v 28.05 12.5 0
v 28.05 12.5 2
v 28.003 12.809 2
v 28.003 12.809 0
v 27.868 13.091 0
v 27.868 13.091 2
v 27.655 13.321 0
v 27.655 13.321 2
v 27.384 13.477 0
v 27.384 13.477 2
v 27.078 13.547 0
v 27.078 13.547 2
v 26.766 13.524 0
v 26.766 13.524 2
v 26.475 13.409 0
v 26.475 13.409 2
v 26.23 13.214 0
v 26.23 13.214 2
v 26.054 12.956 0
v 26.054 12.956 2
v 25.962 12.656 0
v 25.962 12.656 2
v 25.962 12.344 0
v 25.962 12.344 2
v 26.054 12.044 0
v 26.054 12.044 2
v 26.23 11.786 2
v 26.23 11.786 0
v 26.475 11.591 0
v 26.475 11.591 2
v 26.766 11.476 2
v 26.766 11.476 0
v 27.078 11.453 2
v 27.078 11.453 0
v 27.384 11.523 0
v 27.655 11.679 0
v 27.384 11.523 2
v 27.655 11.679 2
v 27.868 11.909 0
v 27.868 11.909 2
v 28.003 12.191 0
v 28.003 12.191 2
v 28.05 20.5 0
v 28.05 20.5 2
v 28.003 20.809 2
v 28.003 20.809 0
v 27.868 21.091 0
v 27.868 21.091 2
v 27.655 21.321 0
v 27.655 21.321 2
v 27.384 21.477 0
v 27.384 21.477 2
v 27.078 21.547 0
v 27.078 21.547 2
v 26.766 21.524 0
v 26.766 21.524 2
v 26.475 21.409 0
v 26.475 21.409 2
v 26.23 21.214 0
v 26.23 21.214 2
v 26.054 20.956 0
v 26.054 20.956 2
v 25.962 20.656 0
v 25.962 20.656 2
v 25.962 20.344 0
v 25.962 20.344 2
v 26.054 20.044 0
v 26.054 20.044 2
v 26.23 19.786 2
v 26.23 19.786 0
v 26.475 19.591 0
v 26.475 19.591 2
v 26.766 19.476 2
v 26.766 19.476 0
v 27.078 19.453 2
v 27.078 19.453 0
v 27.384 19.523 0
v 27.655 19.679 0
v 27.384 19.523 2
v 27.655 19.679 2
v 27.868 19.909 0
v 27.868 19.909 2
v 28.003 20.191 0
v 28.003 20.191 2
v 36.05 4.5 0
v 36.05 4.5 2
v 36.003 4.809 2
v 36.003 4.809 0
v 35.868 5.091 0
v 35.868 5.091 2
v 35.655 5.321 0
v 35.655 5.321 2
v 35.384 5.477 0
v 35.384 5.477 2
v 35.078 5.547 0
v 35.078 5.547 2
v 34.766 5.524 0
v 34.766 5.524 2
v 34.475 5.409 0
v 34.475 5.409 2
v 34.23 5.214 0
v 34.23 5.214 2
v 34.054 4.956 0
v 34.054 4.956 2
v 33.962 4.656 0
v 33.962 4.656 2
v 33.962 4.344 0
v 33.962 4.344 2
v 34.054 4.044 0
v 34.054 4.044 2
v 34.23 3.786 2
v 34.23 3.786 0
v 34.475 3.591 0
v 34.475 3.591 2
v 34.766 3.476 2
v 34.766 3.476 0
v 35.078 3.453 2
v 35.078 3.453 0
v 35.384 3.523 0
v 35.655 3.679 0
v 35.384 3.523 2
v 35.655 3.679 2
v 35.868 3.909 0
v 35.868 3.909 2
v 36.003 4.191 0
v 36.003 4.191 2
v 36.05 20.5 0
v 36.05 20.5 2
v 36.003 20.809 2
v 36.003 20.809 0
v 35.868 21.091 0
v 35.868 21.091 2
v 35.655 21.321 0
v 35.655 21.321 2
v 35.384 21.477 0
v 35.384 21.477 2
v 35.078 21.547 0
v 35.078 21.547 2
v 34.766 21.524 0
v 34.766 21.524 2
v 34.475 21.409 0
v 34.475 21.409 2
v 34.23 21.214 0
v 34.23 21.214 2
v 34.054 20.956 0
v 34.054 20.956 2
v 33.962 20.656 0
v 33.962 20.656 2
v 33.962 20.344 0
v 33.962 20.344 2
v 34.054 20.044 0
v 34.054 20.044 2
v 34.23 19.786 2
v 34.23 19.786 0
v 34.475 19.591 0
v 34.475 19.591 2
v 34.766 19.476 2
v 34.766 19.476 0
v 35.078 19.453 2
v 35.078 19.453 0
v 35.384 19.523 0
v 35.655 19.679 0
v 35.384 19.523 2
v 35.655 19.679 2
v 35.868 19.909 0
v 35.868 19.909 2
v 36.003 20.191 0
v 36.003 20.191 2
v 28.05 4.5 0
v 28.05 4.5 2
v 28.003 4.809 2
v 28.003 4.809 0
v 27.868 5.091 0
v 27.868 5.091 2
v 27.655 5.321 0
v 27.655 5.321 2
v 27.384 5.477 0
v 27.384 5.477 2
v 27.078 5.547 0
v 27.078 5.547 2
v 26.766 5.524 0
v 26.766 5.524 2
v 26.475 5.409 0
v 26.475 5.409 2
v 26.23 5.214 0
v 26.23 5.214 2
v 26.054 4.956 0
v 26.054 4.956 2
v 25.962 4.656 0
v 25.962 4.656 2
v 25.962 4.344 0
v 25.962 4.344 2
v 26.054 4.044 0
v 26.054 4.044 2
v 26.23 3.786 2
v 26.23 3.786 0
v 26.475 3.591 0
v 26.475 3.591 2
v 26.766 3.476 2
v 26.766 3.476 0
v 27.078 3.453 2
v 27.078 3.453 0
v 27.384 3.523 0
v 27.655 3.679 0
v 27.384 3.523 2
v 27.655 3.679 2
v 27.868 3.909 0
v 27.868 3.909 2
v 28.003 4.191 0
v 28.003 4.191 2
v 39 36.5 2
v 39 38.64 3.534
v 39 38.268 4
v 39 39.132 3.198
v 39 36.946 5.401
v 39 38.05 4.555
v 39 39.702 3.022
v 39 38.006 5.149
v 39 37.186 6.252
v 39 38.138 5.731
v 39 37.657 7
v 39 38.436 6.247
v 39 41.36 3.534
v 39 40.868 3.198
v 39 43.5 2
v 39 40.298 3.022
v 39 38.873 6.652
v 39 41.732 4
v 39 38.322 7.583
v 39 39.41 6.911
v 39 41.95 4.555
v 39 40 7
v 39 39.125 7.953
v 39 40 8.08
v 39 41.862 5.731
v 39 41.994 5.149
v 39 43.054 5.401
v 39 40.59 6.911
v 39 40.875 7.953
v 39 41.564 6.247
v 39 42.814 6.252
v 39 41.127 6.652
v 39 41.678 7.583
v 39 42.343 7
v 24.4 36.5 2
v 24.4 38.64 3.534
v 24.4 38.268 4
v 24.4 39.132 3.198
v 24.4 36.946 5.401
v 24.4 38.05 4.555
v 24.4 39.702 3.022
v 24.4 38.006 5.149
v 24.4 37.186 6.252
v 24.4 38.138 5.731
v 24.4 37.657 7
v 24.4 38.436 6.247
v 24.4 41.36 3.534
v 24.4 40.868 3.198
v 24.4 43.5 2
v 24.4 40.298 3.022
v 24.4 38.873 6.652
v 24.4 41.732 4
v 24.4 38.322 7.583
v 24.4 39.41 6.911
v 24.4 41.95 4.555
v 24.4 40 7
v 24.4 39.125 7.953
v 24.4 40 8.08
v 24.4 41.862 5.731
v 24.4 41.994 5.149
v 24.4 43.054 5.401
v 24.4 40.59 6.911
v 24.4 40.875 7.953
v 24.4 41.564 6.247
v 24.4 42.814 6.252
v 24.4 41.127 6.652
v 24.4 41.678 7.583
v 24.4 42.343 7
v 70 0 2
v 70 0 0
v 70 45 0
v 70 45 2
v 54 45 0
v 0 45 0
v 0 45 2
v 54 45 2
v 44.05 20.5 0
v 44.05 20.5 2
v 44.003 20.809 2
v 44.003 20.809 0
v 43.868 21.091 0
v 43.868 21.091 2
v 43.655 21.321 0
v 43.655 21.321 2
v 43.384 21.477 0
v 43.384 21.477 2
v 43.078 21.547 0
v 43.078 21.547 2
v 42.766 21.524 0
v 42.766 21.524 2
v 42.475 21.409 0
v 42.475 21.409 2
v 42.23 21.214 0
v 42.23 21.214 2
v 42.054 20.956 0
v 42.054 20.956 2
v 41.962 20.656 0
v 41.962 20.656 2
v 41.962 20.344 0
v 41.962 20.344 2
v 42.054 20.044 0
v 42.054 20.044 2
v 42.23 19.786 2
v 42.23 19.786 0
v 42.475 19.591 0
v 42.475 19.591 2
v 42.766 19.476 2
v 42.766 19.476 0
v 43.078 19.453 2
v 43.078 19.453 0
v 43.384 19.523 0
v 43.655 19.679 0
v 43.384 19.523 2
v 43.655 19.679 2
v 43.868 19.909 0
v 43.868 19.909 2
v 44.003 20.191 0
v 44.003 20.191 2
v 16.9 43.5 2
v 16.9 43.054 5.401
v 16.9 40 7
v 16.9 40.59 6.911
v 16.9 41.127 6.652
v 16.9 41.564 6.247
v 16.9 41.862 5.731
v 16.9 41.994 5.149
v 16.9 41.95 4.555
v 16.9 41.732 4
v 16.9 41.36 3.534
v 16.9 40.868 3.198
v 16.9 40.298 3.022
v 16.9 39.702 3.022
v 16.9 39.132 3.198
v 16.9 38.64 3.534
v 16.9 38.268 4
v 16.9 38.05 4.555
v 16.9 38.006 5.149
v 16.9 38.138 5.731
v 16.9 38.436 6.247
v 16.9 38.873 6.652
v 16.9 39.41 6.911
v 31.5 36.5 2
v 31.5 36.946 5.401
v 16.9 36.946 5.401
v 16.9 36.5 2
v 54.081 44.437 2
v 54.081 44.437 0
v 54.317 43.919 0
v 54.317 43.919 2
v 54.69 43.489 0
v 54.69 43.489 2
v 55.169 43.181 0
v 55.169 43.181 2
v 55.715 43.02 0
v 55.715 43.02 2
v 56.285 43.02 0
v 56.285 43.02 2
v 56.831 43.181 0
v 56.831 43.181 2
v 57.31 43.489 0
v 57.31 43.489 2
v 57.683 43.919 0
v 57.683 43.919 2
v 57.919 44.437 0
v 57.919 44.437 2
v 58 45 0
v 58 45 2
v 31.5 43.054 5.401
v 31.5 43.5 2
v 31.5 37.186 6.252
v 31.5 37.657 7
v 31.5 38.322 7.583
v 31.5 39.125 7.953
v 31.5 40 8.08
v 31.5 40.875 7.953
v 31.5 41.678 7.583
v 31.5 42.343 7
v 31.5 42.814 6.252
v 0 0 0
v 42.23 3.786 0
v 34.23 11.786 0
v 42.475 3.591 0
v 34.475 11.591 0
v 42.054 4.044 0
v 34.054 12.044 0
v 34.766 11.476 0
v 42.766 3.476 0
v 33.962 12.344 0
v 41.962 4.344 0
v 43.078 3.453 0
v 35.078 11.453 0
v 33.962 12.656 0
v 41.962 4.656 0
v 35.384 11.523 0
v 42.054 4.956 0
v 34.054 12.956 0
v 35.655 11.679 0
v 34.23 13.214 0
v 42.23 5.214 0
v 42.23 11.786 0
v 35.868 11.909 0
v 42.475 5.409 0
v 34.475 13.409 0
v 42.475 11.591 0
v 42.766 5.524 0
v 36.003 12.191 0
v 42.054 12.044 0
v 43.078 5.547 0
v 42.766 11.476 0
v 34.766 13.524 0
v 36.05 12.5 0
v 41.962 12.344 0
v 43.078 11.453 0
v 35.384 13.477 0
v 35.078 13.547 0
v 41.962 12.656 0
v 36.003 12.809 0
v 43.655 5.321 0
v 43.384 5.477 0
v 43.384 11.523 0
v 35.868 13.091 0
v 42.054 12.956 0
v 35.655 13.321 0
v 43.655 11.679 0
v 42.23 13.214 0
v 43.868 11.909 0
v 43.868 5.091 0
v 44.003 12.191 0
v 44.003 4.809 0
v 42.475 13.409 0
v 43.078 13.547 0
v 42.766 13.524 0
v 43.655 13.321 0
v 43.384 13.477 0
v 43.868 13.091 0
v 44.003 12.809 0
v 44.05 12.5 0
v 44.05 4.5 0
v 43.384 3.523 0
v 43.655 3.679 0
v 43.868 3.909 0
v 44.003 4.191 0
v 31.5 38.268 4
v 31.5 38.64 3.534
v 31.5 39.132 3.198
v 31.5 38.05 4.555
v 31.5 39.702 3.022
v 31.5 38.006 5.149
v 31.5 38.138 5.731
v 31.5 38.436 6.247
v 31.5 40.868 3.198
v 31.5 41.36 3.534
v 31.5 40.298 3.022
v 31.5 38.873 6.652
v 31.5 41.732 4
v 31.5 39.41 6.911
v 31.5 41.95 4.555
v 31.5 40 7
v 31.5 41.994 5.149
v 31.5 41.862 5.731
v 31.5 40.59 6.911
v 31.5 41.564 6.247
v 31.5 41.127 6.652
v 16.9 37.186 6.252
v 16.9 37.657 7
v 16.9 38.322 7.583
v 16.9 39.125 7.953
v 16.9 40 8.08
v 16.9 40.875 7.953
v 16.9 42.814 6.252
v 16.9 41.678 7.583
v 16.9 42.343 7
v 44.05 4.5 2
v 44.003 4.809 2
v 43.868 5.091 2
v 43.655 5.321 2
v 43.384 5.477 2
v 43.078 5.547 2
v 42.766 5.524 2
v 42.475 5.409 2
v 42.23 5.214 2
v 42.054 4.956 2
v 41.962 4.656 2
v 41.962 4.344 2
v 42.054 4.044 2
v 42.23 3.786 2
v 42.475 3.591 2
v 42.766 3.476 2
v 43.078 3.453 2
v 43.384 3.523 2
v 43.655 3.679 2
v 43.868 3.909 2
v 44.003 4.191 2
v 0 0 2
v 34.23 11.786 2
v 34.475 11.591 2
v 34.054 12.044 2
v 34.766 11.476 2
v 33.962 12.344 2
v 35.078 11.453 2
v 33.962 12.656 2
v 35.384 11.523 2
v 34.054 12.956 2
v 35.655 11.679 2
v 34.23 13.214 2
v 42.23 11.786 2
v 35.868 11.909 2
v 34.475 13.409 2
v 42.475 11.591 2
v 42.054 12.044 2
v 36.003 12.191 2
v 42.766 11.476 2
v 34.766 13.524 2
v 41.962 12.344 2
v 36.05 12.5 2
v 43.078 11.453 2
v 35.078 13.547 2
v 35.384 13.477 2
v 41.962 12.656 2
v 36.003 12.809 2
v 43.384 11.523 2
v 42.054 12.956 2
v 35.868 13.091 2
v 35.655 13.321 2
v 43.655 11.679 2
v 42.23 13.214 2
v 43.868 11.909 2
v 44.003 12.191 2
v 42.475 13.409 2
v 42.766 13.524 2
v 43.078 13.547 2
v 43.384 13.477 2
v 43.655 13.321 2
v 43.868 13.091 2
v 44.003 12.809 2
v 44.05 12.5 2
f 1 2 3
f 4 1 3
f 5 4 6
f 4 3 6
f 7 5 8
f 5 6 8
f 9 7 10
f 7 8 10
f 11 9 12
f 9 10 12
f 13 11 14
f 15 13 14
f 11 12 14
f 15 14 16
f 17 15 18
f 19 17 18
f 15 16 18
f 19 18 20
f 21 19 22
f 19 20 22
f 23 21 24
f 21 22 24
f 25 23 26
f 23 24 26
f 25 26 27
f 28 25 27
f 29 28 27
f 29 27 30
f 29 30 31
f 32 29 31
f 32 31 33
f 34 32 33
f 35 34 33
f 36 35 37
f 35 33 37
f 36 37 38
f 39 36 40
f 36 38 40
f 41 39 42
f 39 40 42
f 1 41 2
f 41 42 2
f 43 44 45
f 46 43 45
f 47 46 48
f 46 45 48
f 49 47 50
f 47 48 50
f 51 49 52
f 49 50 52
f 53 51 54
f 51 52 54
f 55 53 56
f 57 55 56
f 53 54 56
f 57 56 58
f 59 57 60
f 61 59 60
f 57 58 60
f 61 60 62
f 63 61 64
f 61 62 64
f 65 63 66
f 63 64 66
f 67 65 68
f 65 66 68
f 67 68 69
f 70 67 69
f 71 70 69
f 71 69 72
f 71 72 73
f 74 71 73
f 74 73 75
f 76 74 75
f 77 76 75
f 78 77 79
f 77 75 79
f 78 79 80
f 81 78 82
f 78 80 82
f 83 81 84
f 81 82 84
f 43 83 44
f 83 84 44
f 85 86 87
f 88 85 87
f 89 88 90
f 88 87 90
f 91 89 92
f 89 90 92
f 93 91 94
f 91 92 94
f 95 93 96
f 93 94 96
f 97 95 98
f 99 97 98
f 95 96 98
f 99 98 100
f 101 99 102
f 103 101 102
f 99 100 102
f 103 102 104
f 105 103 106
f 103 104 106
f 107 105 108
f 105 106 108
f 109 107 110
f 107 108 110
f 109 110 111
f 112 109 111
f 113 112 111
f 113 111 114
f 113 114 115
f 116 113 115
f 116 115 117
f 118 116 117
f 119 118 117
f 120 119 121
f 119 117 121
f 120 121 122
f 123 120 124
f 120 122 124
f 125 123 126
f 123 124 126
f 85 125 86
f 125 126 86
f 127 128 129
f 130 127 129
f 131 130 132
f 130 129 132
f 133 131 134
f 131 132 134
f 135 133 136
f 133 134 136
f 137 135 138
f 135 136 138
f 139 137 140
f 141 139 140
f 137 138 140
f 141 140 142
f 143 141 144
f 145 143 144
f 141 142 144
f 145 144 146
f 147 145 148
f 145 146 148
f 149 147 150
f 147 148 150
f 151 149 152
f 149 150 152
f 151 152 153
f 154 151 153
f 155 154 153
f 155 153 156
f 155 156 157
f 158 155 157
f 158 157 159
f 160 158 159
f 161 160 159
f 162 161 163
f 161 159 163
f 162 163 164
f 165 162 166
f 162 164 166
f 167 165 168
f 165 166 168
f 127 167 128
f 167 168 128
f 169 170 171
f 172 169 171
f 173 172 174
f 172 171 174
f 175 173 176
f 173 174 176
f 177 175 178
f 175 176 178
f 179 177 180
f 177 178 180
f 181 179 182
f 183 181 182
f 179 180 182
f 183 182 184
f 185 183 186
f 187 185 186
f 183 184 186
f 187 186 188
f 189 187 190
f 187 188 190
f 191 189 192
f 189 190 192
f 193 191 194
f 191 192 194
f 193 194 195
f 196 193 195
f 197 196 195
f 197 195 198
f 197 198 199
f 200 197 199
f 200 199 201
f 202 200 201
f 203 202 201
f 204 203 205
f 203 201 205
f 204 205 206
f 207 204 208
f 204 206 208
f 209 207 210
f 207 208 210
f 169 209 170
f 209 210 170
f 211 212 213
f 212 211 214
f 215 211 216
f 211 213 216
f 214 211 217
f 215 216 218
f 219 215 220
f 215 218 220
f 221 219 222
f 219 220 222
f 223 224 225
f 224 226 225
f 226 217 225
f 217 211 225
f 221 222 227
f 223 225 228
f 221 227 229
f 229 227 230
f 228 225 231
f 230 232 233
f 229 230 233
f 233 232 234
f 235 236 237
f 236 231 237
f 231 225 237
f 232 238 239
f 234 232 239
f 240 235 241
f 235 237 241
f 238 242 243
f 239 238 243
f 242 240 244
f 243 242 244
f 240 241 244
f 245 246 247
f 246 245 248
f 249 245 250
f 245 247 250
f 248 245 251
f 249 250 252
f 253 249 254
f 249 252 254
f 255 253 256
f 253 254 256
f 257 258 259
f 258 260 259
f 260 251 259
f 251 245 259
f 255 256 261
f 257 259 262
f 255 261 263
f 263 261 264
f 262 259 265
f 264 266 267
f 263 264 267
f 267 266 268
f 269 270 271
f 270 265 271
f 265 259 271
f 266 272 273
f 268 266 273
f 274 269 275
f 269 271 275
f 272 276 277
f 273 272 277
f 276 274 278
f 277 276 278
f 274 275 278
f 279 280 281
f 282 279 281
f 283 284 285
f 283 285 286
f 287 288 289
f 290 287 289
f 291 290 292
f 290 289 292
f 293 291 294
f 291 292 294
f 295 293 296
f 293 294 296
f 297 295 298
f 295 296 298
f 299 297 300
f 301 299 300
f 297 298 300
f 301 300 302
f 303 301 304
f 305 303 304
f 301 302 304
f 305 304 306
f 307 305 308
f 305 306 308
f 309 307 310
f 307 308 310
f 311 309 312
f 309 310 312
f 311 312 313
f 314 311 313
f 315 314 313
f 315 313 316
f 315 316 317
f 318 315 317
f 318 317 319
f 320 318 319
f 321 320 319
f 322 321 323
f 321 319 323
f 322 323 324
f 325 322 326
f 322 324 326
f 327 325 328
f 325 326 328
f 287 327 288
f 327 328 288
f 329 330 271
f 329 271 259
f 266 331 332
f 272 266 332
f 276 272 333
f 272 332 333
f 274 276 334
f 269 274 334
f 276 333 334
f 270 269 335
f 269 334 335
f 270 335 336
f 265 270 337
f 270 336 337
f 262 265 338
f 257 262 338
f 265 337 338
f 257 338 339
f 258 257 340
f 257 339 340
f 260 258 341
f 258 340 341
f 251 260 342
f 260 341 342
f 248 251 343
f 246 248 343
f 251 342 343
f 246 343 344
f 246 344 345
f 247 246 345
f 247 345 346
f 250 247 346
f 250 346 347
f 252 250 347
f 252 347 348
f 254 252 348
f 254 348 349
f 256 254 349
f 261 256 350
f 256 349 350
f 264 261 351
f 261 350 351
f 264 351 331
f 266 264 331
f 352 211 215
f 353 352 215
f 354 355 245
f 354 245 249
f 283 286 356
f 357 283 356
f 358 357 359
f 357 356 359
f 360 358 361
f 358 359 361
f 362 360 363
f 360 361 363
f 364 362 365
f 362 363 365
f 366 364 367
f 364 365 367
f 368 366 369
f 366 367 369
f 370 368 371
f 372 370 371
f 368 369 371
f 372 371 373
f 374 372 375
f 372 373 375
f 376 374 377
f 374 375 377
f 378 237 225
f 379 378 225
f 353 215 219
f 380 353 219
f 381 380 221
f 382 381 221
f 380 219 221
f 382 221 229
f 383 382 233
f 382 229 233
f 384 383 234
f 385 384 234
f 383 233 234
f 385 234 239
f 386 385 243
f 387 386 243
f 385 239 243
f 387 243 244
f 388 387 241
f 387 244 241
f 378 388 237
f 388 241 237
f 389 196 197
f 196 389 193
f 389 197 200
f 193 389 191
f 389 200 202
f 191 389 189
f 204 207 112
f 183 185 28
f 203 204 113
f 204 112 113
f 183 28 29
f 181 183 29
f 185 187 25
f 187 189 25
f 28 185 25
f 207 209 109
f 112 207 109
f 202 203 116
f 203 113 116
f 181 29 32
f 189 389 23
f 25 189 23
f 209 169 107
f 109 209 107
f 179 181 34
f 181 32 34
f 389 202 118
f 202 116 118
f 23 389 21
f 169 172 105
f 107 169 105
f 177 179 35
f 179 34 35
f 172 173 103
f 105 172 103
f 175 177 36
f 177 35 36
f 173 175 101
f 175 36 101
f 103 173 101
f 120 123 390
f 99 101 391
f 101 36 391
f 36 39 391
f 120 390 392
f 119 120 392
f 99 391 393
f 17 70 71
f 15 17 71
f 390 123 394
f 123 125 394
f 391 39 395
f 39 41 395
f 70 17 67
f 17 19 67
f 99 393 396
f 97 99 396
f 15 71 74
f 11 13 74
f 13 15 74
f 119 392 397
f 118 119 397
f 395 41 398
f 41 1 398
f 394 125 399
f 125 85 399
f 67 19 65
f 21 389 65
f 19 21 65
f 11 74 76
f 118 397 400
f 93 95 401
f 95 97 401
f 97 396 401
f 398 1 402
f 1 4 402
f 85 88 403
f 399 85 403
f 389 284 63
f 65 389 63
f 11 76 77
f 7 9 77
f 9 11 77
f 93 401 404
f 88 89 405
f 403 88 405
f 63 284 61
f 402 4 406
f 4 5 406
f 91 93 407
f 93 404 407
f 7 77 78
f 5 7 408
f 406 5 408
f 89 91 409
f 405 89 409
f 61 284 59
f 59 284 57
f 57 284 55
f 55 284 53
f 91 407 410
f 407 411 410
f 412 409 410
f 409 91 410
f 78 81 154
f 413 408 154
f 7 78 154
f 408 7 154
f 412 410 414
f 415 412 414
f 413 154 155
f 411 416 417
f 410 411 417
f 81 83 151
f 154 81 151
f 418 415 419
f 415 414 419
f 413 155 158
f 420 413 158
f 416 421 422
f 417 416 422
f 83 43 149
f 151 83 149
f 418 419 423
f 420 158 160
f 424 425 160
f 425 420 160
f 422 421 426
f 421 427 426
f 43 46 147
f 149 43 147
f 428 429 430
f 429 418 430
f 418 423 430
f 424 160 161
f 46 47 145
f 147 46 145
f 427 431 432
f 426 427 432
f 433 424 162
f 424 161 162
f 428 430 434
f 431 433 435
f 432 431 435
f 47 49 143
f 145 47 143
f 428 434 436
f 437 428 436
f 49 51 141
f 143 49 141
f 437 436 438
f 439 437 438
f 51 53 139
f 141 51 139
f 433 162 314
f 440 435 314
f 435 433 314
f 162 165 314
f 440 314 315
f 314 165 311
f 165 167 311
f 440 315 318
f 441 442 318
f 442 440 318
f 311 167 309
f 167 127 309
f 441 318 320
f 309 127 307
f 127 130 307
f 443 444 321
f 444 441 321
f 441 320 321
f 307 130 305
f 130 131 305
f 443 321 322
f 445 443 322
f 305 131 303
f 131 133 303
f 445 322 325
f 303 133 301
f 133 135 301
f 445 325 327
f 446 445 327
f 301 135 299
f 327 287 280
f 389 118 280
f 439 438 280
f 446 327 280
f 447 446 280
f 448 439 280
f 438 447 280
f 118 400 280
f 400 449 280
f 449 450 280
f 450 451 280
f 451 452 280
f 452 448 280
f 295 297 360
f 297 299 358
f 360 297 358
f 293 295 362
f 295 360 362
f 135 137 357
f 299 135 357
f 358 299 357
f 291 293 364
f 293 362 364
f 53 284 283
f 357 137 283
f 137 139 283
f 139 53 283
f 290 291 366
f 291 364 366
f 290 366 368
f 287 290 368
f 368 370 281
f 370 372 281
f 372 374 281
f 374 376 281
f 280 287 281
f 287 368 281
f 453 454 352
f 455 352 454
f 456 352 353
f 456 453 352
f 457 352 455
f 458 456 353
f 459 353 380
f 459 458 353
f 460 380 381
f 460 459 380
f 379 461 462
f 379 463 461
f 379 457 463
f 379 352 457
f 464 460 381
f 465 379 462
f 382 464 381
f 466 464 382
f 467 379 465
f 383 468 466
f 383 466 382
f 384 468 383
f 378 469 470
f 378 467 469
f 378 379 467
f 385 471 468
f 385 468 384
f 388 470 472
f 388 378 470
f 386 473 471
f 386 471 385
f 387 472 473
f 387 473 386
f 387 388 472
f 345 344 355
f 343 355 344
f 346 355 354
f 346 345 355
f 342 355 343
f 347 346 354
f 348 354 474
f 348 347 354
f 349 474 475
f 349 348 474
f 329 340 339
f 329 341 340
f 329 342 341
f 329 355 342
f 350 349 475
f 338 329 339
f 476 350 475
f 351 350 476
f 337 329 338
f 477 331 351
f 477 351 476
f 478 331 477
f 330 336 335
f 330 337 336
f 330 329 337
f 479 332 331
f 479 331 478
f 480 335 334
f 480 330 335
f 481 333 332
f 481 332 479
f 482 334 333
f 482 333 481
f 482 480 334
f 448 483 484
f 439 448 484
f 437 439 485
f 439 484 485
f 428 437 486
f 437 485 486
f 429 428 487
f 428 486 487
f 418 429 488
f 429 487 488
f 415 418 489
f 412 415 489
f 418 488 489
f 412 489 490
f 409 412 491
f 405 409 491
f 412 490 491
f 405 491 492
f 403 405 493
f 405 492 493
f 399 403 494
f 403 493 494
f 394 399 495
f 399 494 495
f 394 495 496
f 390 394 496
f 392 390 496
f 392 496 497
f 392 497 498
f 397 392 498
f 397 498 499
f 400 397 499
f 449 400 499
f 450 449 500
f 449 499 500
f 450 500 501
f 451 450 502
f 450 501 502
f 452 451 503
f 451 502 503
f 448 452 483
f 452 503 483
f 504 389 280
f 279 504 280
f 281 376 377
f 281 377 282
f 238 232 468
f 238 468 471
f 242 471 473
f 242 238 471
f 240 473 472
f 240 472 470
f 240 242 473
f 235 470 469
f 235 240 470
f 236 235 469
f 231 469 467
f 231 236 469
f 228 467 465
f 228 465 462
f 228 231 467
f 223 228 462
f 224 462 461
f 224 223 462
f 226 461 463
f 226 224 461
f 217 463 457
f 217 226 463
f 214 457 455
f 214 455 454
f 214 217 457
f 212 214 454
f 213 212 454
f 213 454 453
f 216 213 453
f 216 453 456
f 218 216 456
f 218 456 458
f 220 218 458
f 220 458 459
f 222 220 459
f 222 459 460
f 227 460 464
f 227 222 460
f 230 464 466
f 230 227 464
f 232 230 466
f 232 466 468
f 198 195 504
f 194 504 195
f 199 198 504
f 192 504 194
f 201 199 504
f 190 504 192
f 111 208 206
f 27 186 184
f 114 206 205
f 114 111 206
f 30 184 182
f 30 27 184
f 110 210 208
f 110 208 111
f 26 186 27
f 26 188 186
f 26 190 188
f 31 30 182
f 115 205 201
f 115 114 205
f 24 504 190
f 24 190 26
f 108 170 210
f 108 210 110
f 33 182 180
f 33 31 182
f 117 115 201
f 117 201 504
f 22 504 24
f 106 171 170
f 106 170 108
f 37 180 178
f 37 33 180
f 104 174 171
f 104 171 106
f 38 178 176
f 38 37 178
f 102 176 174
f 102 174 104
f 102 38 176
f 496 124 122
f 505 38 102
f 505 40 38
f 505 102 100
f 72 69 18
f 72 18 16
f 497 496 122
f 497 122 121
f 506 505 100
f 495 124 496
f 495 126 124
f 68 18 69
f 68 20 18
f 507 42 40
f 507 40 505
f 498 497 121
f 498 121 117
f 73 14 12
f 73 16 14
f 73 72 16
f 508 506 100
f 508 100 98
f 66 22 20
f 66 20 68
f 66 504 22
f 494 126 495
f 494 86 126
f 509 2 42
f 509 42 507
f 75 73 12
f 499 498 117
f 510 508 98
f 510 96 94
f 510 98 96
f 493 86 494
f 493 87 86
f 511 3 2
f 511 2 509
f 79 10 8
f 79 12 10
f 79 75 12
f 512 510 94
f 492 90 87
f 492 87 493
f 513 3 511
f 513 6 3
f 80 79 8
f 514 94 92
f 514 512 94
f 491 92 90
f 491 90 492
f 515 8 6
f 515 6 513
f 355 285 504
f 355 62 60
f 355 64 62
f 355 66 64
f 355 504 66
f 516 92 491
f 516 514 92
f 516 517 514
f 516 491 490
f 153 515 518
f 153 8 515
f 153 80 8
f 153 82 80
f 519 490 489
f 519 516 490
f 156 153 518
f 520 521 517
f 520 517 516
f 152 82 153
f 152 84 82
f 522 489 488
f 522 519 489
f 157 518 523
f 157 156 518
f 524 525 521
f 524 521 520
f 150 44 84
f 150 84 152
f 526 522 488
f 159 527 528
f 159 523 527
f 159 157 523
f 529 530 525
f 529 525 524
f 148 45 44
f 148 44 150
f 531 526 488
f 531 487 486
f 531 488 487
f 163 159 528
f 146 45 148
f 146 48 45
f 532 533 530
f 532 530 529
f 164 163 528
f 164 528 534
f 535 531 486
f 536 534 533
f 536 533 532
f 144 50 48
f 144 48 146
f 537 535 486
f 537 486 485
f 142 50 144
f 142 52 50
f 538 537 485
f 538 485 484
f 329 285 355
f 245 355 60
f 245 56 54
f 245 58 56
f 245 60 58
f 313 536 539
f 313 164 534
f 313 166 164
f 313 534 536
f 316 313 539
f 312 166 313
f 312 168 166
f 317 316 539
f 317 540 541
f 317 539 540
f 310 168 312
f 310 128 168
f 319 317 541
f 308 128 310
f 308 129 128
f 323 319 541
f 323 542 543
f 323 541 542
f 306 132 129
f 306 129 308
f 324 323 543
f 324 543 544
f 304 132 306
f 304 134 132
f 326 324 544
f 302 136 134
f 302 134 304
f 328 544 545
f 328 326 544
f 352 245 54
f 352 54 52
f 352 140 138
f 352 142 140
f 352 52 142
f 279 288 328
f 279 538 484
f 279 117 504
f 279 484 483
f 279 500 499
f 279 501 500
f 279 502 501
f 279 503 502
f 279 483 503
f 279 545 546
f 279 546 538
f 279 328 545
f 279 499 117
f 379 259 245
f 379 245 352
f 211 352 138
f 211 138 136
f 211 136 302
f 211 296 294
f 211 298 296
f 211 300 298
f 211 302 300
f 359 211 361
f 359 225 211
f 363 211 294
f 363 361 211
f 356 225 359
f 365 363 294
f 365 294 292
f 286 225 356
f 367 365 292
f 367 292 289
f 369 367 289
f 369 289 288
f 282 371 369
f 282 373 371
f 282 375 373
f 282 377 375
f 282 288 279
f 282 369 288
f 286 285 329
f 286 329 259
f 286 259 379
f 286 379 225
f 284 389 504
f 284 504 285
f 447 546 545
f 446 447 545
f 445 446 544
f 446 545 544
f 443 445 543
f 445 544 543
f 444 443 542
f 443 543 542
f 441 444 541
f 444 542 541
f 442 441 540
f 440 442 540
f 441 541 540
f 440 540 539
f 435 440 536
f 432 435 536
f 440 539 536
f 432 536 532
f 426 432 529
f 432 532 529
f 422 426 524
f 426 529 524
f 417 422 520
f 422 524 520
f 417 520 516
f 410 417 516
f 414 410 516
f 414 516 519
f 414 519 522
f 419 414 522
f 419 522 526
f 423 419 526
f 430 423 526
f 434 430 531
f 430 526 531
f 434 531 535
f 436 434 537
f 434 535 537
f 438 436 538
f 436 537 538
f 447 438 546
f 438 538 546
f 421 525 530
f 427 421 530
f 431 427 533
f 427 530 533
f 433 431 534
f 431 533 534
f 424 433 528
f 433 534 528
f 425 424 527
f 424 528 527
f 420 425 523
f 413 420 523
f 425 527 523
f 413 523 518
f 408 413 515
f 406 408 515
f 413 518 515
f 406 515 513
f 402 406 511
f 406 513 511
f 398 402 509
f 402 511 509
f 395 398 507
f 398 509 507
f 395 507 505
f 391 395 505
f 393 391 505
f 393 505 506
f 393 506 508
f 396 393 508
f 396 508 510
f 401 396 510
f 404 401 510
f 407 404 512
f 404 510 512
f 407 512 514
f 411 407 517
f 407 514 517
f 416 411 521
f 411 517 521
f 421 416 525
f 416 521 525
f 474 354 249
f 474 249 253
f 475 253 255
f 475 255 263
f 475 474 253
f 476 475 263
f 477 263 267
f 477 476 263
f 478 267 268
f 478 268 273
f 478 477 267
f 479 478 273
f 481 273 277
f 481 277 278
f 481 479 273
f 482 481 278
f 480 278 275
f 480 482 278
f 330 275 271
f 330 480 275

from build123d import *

# Parameters (mm, degrees)
SKETCH2_W           = 70
SKETCH2_H           = 45
BOSS_EXTRUDE1_DEPTH = 2
SKETCH3_R           = 1.05
CUT_EXTRUDE1_DEPTH  = 2
SKETCH6_R           = 2
BOSS_EXTRUDE2_DEPTH = 7.5
SKETCH4_R           = 2
CUT_EXTRUDE2_DEPTH  = 10


with BuildPart() as part:
    # Sketch2 → Boss-Extrude1 (new body)
    with BuildSketch(Plane.XY):
        with Locations((35, 22.5)):
            Rectangle(SKETCH2_W, SKETCH2_H)
    extrude(amount=BOSS_EXTRUDE1_DEPTH)

    # Sketch3 → Cut-Extrude1 (cut)
    with BuildSketch(Plane.XY.offset(2)):
        with Locations((35, 4.5)):
            Circle(SKETCH3_R)
        with Locations((43, 4.5)):
            Circle(SKETCH3_R)
        with Locations((27, 4.5)):
            Circle(SKETCH3_R)
        with Locations((27, 12.5)):
            Circle(SKETCH3_R)
        with Locations((35, 12.5)):
            Circle(SKETCH3_R)
        with Locations((43, 12.5)):
            Circle(SKETCH3_R)
        with Locations((27, 20.5)):
            Circle(SKETCH3_R)
        with Locations((35, 20.5)):
            Circle(SKETCH3_R)
        with Locations((43, 20.5)):
            Circle(SKETCH3_R)
    extrude(amount=-CUT_EXTRUDE1_DEPTH, mode=Mode.SUBTRACT)

    # Sketch6 → Boss-Extrude2 (add)
    with BuildSketch(Plane.ZY.offset(-16.9)):
        with BuildLine():
            Line((2, 43.5), (2, 36.5))
            Line((2, 36.5), (5.400666216, 36.946171815))
            ThreePointArc((5.400666216, 36.946171815), (8.08, 40), (5.400666216, 43.053828185))
            Line((5.400666216, 43.053828185), (2, 43.5))
        make_face()
        with Locations((5, 40)):
            Circle(SKETCH6_R, mode=Mode.SUBTRACT)
    boss_extrude2 = extrude(amount=-BOSS_EXTRUDE2_DEPTH)

    # Mirror4: Boss-Extrude2 across plane
    add(boss_extrude2.mirror(Plane(origin=(27.95, 0, 0), x_dir=(0, 0, 1), z_dir=(1, 0, 0))))

    # Sketch4 → Cut-Extrude2 (cut)
    with BuildSketch(Plane.XY.offset(2)):
        with Locations((56, 45)):
            Circle(SKETCH4_R)
    extrude(amount=-CUT_EXTRUDE2_DEPTH, mode=Mode.SUBTRACT)


solid = part.part
